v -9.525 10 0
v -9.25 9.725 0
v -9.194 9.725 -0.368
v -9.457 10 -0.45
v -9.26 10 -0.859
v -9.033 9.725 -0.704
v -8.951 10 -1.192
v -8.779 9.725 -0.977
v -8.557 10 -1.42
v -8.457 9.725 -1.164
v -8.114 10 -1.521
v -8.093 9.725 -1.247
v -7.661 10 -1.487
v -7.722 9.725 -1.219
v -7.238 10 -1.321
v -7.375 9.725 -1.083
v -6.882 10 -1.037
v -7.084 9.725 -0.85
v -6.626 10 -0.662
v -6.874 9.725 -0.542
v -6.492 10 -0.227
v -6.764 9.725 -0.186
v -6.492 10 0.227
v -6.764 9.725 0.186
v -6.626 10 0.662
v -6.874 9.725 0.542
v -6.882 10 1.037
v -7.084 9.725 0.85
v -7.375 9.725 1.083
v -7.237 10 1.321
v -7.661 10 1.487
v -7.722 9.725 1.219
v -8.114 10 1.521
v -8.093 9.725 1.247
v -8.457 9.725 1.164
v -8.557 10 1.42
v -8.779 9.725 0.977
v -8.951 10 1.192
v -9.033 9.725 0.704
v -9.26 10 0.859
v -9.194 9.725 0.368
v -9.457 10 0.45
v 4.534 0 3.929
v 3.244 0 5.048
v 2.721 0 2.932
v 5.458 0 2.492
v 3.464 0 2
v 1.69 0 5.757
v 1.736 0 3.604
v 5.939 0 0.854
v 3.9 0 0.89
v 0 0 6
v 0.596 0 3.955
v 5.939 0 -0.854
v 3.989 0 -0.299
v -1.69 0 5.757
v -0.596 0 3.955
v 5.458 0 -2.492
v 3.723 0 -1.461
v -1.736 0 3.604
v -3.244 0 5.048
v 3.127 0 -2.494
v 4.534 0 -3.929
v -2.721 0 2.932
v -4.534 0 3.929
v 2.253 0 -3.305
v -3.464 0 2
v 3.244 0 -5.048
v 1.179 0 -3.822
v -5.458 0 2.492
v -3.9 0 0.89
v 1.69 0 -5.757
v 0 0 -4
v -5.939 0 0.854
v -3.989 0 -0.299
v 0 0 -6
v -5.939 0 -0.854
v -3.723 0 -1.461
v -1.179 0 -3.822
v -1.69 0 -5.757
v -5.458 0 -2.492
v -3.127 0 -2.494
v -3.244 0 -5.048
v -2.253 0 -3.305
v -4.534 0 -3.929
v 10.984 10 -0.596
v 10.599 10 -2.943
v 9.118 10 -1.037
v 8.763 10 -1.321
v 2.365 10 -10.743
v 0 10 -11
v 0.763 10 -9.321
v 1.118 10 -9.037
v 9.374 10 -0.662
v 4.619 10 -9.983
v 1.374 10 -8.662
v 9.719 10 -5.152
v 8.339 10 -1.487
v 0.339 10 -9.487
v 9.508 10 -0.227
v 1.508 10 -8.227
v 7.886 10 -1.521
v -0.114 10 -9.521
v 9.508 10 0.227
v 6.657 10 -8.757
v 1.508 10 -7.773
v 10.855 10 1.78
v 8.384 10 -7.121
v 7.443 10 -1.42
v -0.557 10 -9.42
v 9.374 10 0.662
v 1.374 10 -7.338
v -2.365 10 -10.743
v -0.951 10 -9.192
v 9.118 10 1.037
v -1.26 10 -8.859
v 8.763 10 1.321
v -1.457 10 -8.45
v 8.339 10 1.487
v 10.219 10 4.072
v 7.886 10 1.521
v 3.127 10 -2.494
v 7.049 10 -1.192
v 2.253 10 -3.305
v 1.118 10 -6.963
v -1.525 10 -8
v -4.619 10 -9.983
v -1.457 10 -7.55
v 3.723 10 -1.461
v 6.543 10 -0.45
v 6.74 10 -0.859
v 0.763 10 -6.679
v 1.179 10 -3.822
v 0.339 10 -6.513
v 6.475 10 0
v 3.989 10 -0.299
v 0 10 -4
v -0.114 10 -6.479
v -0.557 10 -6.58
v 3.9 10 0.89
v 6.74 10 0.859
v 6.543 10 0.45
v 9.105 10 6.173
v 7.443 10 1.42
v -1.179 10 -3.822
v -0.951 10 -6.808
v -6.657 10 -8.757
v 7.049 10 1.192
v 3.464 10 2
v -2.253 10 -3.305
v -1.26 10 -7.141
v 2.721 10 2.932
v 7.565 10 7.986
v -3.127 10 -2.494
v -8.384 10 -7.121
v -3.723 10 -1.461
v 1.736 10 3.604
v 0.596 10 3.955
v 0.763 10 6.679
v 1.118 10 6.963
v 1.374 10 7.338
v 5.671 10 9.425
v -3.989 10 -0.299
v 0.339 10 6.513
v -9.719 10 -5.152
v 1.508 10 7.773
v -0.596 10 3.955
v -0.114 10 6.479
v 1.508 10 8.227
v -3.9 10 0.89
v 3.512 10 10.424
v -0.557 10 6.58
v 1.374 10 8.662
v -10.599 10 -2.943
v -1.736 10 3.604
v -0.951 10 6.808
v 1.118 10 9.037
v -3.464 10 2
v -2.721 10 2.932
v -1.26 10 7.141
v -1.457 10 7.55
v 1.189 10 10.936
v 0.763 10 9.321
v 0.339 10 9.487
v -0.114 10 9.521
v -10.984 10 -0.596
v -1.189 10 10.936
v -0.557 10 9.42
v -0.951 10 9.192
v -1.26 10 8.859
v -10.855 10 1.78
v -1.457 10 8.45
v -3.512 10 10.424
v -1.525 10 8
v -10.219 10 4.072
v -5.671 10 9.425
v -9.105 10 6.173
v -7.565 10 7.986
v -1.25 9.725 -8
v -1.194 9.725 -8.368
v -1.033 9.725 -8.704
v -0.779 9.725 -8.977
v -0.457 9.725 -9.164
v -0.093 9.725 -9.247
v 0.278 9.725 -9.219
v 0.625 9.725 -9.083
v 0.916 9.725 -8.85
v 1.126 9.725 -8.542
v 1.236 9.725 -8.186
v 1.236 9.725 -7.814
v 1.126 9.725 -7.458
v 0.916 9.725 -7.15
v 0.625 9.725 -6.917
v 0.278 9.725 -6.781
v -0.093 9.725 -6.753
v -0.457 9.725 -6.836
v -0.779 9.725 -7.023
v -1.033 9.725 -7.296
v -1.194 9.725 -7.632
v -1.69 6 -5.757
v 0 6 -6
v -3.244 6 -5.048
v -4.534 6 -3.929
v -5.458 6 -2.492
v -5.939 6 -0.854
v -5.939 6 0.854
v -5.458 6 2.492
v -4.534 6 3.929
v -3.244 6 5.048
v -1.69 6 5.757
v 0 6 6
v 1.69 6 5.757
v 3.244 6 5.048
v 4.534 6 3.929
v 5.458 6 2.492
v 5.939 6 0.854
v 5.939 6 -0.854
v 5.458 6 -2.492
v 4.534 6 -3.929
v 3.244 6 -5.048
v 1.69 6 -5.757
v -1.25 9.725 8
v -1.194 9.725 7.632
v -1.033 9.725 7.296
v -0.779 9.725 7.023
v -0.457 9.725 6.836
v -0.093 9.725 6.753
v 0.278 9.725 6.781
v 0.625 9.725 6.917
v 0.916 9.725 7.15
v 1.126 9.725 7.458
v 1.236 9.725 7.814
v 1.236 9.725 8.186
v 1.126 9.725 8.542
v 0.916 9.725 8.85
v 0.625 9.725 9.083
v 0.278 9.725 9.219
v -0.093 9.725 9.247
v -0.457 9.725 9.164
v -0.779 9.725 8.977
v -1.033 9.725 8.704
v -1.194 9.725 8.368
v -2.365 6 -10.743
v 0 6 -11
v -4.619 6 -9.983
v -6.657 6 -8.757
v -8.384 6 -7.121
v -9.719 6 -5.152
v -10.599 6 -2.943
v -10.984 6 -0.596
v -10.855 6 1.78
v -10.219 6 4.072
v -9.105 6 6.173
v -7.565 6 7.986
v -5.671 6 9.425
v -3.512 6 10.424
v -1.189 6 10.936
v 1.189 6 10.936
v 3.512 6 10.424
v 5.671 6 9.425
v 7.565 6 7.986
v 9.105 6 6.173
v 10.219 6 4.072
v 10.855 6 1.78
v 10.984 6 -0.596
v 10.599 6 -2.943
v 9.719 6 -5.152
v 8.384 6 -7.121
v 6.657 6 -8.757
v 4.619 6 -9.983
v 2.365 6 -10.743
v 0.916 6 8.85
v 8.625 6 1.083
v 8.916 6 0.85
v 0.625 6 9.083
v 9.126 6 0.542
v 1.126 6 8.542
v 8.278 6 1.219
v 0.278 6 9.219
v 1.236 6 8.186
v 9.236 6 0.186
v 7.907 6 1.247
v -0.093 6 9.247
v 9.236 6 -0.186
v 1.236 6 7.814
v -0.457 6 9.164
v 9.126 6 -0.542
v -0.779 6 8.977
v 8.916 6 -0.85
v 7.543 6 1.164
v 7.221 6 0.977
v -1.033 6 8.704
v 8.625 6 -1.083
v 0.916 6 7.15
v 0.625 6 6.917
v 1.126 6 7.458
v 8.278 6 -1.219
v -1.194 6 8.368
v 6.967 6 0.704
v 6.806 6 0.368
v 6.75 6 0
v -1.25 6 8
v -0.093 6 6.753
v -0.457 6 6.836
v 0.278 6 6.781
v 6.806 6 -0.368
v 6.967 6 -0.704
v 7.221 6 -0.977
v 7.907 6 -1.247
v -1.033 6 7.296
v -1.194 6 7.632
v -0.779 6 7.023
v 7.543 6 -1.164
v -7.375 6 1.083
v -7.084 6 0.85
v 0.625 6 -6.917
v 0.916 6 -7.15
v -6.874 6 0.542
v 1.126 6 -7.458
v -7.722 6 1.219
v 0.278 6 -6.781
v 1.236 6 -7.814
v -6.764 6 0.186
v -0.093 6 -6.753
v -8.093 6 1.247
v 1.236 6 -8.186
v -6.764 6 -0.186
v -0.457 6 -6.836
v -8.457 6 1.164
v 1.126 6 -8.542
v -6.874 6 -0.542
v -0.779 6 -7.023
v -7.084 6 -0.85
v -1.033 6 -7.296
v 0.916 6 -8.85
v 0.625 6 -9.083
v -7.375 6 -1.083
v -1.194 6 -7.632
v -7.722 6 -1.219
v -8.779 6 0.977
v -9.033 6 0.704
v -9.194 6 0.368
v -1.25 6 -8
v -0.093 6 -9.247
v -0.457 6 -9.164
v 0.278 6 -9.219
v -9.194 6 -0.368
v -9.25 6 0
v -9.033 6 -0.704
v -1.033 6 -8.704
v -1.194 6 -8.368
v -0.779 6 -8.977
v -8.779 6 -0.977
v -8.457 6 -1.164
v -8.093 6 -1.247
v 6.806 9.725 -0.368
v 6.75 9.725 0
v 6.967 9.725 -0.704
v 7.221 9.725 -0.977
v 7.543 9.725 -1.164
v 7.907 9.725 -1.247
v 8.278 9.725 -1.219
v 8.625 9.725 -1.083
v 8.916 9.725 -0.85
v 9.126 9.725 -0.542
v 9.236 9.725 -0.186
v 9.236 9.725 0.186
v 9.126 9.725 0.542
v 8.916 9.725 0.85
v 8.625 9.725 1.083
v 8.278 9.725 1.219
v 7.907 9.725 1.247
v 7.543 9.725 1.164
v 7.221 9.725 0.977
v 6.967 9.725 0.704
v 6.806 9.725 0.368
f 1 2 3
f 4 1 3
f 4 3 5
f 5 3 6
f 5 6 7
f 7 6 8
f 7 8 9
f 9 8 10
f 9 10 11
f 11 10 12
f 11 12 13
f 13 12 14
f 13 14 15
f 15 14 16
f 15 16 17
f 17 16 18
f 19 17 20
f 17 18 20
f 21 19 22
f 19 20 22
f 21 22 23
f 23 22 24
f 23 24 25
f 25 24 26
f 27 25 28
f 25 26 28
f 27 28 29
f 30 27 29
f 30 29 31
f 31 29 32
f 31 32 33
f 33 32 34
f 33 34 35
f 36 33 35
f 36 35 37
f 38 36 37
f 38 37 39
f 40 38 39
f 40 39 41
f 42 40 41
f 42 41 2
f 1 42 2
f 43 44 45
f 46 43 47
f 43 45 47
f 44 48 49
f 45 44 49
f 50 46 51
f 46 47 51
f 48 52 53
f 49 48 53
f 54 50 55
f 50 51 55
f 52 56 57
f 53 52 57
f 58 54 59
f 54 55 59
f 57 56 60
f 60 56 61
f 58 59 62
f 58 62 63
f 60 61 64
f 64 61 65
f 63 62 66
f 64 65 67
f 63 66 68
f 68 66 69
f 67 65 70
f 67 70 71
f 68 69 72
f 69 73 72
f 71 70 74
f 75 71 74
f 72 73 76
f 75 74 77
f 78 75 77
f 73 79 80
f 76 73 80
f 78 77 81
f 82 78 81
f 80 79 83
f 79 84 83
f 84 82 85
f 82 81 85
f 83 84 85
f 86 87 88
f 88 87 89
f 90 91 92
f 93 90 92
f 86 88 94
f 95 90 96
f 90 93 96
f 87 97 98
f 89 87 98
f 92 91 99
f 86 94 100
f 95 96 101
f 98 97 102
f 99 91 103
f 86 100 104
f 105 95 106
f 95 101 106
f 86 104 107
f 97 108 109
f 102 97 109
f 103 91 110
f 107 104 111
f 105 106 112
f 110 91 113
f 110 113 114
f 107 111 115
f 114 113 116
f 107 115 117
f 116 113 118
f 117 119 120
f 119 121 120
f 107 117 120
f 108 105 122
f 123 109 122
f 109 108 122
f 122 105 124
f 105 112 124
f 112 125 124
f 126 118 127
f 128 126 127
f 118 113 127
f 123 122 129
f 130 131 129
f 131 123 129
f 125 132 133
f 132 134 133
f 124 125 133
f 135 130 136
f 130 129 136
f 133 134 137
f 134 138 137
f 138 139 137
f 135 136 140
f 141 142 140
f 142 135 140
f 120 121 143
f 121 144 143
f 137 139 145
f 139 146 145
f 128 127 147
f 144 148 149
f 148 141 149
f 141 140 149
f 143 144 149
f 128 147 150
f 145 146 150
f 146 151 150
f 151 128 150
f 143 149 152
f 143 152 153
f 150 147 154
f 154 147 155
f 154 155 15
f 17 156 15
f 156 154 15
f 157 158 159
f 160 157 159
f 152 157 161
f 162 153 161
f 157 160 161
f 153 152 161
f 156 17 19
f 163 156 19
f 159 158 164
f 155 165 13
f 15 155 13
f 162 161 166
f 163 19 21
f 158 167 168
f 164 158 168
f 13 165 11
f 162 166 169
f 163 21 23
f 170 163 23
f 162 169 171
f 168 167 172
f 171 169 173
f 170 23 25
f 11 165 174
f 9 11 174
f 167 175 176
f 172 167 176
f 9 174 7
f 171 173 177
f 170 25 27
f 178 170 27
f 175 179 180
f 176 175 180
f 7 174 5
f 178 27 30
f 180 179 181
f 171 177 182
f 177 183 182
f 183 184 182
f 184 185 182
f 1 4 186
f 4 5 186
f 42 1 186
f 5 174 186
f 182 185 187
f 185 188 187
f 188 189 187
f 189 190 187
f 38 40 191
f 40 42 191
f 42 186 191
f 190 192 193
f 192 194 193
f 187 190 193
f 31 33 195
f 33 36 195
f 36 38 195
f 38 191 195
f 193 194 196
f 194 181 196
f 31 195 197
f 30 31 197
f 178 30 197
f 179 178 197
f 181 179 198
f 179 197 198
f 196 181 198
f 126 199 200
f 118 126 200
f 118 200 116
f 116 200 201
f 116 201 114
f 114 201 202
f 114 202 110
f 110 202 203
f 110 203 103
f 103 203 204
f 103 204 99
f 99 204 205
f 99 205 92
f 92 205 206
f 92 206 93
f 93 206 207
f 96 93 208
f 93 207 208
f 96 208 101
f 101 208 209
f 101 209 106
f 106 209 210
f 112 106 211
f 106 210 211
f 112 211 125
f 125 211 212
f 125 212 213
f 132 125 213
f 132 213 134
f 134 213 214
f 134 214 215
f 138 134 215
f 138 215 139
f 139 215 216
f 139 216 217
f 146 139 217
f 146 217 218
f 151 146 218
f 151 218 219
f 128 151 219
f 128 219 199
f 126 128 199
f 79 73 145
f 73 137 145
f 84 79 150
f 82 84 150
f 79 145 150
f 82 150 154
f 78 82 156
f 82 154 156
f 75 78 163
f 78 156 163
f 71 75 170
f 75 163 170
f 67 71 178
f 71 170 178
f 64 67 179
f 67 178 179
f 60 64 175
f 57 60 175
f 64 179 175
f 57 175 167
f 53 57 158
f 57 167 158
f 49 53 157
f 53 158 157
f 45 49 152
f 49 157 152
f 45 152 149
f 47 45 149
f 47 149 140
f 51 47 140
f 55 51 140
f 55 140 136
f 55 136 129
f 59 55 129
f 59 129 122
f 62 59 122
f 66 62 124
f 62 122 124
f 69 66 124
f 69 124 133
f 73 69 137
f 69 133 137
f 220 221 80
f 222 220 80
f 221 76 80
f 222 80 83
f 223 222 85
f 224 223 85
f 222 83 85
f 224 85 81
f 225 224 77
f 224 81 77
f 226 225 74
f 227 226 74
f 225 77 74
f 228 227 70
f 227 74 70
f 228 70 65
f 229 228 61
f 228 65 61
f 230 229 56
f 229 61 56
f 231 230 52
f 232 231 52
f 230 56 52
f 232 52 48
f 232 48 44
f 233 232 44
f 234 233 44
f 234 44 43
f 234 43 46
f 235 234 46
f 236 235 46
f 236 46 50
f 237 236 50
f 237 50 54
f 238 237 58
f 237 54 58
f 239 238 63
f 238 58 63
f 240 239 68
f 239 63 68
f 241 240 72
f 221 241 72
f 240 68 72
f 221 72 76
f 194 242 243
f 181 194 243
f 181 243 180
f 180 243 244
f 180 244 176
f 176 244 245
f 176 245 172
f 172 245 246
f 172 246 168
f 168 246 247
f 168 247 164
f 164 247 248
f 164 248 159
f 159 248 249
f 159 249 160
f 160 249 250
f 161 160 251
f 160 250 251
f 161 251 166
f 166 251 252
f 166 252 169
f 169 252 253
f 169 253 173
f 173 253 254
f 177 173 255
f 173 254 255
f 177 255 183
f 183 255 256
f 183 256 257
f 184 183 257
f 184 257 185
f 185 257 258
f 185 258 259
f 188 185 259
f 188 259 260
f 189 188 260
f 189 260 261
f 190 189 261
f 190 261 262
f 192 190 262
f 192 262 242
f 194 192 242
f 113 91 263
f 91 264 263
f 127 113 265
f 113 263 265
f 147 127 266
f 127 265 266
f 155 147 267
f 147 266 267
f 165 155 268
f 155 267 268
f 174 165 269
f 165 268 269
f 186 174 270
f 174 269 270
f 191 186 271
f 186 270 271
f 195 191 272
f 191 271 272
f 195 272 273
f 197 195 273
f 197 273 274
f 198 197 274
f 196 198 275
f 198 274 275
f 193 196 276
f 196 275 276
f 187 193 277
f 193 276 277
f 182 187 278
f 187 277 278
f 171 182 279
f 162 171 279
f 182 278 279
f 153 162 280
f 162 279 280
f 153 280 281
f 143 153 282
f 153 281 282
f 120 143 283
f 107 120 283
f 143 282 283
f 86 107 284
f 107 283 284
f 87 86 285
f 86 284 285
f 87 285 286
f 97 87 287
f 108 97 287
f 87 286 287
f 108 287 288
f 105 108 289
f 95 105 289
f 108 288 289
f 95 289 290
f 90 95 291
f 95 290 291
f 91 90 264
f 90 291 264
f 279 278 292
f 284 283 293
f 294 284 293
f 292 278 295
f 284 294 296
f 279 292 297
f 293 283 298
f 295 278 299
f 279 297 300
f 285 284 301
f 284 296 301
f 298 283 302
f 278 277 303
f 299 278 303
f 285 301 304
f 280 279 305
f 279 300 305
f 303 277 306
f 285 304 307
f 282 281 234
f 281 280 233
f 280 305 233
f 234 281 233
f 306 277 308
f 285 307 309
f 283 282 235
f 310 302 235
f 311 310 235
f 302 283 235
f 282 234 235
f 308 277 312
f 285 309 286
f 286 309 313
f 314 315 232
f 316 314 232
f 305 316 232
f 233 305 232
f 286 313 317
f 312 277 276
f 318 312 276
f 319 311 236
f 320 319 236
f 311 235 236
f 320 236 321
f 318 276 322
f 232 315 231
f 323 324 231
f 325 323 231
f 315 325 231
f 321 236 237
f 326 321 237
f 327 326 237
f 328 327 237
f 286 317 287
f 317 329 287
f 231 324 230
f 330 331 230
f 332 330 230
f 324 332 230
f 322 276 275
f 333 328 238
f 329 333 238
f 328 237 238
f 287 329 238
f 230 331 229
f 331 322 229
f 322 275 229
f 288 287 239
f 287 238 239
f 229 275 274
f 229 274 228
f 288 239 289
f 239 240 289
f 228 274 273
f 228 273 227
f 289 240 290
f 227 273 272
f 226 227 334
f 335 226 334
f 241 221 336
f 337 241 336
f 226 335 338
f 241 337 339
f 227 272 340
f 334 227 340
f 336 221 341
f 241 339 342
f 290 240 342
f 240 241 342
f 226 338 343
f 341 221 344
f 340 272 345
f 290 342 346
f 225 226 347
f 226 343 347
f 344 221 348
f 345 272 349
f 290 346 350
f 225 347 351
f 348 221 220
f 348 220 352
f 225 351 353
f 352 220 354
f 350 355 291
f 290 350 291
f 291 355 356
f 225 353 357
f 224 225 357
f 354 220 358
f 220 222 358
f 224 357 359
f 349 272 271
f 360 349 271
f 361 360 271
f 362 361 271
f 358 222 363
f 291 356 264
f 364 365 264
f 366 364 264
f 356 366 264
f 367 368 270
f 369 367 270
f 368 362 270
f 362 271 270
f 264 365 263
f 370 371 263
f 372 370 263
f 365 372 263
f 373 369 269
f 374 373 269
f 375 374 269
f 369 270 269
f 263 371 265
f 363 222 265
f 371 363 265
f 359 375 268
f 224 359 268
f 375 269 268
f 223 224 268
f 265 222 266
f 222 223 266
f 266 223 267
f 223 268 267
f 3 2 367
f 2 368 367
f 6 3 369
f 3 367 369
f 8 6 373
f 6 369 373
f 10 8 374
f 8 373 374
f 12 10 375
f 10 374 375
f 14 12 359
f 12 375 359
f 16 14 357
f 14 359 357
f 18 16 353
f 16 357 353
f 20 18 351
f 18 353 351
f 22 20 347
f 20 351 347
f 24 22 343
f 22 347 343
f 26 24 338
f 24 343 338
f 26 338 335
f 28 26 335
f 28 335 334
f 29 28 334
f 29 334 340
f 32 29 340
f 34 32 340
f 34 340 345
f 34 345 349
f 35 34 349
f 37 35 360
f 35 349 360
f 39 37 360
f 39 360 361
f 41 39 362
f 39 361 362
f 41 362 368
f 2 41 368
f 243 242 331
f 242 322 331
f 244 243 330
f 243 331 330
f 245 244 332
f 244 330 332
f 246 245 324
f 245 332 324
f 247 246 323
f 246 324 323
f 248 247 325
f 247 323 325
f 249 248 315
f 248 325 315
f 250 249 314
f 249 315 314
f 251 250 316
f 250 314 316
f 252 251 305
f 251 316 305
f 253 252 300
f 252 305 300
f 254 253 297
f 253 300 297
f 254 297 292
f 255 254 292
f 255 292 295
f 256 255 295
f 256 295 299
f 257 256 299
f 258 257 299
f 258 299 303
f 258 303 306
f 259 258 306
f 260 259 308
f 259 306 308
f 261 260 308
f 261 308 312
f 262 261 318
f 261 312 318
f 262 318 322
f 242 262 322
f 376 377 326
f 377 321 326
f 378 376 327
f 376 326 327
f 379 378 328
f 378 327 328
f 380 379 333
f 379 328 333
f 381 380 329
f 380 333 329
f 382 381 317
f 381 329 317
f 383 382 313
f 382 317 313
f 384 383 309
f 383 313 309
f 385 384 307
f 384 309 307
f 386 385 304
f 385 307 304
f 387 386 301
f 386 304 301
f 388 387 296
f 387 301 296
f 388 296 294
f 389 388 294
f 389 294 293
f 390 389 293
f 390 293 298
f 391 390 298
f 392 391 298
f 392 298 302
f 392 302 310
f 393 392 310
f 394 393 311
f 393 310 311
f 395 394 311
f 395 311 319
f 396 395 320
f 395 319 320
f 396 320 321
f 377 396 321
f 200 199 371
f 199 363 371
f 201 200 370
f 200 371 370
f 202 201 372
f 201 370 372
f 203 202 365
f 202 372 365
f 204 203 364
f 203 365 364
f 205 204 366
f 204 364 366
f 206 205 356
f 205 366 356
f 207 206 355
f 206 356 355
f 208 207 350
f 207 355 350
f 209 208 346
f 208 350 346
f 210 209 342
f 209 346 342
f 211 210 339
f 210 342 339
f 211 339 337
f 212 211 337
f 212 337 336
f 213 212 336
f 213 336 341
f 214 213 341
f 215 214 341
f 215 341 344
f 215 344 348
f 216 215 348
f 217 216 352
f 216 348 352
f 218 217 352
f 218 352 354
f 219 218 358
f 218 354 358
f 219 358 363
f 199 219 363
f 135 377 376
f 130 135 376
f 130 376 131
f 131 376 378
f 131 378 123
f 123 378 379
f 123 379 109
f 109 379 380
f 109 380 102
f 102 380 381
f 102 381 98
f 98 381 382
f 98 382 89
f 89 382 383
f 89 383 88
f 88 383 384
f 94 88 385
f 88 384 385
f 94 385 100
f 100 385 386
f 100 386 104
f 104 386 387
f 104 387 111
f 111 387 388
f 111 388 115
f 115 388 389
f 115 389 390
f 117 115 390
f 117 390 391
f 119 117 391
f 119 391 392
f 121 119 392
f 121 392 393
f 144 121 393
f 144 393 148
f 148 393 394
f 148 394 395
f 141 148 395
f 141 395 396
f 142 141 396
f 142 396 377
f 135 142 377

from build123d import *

# Parameters (mm, degrees)
M3X0_5_TAPPED_HOLE1_D           = 2.5
M3X0_5_TAPPED_HOLE1_CSINK_D     = 3.05
M3X0_5_TAPPED_HOLE1_CSINK_ANGLE = 90


with BuildPart() as part:
    # Sketch1 → Revolve1 (revolve)
    with BuildSketch(Plane.XY, mode=Mode.PRIVATE) as revolve1_sk:
        Polygon((4, 0), (4, 10), (11, 10), (11, 6), (6, 6), (6, 0), align=None)
    revolve(revolve1_sk.sketch.rotate(Axis((0, 0, 0), (0, 1, 0)), 90), axis=Axis((0, 0, 0), (0, 1, 0)))

    # M3x0.5 Tapped Hole1 (through all)
    with Locations(Plane(origin=(0, 10, 0), x_dir=(1, 0, 0), z_dir=(0, 1, 0))):
        with Locations((0, 8), (8, 0), (0, -8), (-8, 0), (0, 0)):
            CounterSinkHole(M3X0_5_TAPPED_HOLE1_D / 2, M3X0_5_TAPPED_HOLE1_CSINK_D / 2, counter_sink_angle=M3X0_5_TAPPED_HOLE1_CSINK_ANGLE)


solid = part.part
